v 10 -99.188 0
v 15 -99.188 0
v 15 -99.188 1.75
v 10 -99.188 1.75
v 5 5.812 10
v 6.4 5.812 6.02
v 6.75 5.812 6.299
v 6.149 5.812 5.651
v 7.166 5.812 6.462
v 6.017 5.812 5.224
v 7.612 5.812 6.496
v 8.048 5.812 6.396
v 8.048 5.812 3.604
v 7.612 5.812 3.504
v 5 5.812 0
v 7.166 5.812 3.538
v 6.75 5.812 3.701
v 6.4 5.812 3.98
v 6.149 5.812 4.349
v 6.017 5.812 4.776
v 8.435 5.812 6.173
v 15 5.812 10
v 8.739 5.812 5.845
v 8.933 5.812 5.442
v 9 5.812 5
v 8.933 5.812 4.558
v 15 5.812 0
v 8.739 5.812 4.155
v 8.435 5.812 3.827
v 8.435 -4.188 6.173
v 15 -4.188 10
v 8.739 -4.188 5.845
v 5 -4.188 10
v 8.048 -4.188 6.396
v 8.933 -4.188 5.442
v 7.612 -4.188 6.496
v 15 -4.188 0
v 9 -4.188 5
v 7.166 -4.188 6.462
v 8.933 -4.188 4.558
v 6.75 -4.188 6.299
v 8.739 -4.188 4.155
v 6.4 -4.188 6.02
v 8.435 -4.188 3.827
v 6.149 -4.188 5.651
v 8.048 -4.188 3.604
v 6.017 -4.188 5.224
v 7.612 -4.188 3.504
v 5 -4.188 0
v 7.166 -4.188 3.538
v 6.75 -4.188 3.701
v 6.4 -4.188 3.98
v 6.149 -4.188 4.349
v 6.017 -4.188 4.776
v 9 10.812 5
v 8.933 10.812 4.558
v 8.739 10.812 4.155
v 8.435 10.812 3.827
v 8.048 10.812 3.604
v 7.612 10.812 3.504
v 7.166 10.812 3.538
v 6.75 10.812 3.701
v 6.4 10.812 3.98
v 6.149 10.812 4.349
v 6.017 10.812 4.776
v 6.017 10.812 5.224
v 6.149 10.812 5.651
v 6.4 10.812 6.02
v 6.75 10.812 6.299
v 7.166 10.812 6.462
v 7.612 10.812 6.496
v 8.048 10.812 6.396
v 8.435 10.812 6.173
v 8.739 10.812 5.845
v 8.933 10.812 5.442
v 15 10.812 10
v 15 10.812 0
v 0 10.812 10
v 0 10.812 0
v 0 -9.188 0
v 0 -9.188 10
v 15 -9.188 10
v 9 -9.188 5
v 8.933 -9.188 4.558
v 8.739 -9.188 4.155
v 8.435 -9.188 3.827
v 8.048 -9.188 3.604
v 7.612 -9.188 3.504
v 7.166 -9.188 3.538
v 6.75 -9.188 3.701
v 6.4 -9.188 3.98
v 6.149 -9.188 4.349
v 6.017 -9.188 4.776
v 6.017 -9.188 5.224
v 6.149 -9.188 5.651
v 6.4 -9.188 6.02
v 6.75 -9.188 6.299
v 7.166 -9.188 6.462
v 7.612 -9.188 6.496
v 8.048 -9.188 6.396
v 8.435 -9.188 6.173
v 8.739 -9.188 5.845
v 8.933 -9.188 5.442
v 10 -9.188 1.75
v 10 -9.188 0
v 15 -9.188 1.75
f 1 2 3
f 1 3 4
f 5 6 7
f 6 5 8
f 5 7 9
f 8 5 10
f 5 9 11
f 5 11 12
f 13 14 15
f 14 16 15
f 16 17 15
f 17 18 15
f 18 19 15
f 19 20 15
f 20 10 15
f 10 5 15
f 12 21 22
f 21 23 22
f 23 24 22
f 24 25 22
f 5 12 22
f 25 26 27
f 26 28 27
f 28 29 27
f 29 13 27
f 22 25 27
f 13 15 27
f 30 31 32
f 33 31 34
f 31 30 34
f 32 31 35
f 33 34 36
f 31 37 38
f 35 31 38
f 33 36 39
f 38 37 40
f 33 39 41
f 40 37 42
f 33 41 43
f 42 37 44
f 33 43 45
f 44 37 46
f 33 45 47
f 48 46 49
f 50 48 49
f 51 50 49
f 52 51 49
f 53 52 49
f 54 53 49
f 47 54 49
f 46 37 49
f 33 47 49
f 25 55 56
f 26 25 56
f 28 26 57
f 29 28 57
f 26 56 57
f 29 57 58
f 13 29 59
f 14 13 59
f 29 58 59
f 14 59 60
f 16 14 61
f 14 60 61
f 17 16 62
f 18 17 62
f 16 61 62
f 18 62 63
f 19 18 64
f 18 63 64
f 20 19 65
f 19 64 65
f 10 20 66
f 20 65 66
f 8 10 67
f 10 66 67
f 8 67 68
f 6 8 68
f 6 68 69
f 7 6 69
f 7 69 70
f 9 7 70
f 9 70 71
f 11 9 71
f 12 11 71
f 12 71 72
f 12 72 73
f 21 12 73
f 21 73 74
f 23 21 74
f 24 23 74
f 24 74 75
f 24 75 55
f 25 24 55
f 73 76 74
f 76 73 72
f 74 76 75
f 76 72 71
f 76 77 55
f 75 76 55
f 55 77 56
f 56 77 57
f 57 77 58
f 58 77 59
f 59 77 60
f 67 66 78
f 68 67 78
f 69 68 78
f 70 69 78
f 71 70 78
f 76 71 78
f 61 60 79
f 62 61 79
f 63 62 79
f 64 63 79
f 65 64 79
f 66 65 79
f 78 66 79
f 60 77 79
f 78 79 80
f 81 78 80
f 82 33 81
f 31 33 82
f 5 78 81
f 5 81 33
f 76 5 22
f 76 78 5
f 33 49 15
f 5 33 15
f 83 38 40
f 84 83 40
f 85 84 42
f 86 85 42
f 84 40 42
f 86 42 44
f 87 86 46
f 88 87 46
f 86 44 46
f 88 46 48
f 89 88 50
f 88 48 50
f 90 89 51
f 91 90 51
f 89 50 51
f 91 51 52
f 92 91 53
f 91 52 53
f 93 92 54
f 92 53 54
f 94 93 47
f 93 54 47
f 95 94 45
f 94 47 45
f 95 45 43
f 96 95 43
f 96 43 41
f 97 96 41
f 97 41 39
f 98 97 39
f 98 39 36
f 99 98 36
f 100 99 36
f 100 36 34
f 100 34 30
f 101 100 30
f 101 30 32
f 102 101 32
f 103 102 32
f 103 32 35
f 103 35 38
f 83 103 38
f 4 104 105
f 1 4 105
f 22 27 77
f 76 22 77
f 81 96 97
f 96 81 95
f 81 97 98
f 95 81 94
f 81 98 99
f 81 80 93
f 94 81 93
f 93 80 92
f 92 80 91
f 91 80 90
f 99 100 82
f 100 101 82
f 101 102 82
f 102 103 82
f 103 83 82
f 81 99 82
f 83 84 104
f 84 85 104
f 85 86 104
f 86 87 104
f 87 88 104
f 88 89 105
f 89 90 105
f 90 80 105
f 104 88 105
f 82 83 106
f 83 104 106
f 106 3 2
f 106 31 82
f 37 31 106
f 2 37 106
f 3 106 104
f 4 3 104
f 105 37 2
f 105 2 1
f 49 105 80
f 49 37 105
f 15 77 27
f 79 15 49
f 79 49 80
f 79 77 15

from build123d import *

# Parameters (mm, degrees)
BOSS_EXTRUDE1_DEPTH = 10
SKETCH3_W           = 5
SKETCH3_H           = 1.75
BOSS_EXTRUDE2_DEPTH = 90
SKETCH4_R           = 1.5
CUT_EXTRUDE1_DEPTH  = 111


with BuildPart() as part:
    # Sketch1 → Boss-Extrude1 (new body)
    with BuildSketch(Plane.XY):
        Polygon((0, 10.81190481), (0, -9.18809519), (15, -9.18809519), (15, -4.18809519), (5, -4.18809519), (5, 5.81190481), (15, 5.81190481), (15, 10.81190481), align=None)
    extrude(amount=BOSS_EXTRUDE1_DEPTH)

    # Sketch3 → Boss-Extrude2 (add)
    with BuildSketch(Plane(origin=(0, -9.18809519, 0), x_dir=(-1, 0, 0), z_dir=(0, -1, 0))):
        with Locations((-12.5, -0.875)):
            Rectangle(SKETCH3_W, SKETCH3_H)
    extrude(amount=BOSS_EXTRUDE2_DEPTH)

    # Sketch4 → Cut-Extrude1 (cut, through all)
    with BuildSketch(Plane(origin=(0, 10.81190481, 0), x_dir=(1, 0, 0), z_dir=(0, 1, 0))):
        with Locations((7.5, -5)):
            Circle(SKETCH4_R)
    extrude(amount=-CUT_EXTRUDE1_DEPTH, mode=Mode.SUBTRACT)


solid = part.part
